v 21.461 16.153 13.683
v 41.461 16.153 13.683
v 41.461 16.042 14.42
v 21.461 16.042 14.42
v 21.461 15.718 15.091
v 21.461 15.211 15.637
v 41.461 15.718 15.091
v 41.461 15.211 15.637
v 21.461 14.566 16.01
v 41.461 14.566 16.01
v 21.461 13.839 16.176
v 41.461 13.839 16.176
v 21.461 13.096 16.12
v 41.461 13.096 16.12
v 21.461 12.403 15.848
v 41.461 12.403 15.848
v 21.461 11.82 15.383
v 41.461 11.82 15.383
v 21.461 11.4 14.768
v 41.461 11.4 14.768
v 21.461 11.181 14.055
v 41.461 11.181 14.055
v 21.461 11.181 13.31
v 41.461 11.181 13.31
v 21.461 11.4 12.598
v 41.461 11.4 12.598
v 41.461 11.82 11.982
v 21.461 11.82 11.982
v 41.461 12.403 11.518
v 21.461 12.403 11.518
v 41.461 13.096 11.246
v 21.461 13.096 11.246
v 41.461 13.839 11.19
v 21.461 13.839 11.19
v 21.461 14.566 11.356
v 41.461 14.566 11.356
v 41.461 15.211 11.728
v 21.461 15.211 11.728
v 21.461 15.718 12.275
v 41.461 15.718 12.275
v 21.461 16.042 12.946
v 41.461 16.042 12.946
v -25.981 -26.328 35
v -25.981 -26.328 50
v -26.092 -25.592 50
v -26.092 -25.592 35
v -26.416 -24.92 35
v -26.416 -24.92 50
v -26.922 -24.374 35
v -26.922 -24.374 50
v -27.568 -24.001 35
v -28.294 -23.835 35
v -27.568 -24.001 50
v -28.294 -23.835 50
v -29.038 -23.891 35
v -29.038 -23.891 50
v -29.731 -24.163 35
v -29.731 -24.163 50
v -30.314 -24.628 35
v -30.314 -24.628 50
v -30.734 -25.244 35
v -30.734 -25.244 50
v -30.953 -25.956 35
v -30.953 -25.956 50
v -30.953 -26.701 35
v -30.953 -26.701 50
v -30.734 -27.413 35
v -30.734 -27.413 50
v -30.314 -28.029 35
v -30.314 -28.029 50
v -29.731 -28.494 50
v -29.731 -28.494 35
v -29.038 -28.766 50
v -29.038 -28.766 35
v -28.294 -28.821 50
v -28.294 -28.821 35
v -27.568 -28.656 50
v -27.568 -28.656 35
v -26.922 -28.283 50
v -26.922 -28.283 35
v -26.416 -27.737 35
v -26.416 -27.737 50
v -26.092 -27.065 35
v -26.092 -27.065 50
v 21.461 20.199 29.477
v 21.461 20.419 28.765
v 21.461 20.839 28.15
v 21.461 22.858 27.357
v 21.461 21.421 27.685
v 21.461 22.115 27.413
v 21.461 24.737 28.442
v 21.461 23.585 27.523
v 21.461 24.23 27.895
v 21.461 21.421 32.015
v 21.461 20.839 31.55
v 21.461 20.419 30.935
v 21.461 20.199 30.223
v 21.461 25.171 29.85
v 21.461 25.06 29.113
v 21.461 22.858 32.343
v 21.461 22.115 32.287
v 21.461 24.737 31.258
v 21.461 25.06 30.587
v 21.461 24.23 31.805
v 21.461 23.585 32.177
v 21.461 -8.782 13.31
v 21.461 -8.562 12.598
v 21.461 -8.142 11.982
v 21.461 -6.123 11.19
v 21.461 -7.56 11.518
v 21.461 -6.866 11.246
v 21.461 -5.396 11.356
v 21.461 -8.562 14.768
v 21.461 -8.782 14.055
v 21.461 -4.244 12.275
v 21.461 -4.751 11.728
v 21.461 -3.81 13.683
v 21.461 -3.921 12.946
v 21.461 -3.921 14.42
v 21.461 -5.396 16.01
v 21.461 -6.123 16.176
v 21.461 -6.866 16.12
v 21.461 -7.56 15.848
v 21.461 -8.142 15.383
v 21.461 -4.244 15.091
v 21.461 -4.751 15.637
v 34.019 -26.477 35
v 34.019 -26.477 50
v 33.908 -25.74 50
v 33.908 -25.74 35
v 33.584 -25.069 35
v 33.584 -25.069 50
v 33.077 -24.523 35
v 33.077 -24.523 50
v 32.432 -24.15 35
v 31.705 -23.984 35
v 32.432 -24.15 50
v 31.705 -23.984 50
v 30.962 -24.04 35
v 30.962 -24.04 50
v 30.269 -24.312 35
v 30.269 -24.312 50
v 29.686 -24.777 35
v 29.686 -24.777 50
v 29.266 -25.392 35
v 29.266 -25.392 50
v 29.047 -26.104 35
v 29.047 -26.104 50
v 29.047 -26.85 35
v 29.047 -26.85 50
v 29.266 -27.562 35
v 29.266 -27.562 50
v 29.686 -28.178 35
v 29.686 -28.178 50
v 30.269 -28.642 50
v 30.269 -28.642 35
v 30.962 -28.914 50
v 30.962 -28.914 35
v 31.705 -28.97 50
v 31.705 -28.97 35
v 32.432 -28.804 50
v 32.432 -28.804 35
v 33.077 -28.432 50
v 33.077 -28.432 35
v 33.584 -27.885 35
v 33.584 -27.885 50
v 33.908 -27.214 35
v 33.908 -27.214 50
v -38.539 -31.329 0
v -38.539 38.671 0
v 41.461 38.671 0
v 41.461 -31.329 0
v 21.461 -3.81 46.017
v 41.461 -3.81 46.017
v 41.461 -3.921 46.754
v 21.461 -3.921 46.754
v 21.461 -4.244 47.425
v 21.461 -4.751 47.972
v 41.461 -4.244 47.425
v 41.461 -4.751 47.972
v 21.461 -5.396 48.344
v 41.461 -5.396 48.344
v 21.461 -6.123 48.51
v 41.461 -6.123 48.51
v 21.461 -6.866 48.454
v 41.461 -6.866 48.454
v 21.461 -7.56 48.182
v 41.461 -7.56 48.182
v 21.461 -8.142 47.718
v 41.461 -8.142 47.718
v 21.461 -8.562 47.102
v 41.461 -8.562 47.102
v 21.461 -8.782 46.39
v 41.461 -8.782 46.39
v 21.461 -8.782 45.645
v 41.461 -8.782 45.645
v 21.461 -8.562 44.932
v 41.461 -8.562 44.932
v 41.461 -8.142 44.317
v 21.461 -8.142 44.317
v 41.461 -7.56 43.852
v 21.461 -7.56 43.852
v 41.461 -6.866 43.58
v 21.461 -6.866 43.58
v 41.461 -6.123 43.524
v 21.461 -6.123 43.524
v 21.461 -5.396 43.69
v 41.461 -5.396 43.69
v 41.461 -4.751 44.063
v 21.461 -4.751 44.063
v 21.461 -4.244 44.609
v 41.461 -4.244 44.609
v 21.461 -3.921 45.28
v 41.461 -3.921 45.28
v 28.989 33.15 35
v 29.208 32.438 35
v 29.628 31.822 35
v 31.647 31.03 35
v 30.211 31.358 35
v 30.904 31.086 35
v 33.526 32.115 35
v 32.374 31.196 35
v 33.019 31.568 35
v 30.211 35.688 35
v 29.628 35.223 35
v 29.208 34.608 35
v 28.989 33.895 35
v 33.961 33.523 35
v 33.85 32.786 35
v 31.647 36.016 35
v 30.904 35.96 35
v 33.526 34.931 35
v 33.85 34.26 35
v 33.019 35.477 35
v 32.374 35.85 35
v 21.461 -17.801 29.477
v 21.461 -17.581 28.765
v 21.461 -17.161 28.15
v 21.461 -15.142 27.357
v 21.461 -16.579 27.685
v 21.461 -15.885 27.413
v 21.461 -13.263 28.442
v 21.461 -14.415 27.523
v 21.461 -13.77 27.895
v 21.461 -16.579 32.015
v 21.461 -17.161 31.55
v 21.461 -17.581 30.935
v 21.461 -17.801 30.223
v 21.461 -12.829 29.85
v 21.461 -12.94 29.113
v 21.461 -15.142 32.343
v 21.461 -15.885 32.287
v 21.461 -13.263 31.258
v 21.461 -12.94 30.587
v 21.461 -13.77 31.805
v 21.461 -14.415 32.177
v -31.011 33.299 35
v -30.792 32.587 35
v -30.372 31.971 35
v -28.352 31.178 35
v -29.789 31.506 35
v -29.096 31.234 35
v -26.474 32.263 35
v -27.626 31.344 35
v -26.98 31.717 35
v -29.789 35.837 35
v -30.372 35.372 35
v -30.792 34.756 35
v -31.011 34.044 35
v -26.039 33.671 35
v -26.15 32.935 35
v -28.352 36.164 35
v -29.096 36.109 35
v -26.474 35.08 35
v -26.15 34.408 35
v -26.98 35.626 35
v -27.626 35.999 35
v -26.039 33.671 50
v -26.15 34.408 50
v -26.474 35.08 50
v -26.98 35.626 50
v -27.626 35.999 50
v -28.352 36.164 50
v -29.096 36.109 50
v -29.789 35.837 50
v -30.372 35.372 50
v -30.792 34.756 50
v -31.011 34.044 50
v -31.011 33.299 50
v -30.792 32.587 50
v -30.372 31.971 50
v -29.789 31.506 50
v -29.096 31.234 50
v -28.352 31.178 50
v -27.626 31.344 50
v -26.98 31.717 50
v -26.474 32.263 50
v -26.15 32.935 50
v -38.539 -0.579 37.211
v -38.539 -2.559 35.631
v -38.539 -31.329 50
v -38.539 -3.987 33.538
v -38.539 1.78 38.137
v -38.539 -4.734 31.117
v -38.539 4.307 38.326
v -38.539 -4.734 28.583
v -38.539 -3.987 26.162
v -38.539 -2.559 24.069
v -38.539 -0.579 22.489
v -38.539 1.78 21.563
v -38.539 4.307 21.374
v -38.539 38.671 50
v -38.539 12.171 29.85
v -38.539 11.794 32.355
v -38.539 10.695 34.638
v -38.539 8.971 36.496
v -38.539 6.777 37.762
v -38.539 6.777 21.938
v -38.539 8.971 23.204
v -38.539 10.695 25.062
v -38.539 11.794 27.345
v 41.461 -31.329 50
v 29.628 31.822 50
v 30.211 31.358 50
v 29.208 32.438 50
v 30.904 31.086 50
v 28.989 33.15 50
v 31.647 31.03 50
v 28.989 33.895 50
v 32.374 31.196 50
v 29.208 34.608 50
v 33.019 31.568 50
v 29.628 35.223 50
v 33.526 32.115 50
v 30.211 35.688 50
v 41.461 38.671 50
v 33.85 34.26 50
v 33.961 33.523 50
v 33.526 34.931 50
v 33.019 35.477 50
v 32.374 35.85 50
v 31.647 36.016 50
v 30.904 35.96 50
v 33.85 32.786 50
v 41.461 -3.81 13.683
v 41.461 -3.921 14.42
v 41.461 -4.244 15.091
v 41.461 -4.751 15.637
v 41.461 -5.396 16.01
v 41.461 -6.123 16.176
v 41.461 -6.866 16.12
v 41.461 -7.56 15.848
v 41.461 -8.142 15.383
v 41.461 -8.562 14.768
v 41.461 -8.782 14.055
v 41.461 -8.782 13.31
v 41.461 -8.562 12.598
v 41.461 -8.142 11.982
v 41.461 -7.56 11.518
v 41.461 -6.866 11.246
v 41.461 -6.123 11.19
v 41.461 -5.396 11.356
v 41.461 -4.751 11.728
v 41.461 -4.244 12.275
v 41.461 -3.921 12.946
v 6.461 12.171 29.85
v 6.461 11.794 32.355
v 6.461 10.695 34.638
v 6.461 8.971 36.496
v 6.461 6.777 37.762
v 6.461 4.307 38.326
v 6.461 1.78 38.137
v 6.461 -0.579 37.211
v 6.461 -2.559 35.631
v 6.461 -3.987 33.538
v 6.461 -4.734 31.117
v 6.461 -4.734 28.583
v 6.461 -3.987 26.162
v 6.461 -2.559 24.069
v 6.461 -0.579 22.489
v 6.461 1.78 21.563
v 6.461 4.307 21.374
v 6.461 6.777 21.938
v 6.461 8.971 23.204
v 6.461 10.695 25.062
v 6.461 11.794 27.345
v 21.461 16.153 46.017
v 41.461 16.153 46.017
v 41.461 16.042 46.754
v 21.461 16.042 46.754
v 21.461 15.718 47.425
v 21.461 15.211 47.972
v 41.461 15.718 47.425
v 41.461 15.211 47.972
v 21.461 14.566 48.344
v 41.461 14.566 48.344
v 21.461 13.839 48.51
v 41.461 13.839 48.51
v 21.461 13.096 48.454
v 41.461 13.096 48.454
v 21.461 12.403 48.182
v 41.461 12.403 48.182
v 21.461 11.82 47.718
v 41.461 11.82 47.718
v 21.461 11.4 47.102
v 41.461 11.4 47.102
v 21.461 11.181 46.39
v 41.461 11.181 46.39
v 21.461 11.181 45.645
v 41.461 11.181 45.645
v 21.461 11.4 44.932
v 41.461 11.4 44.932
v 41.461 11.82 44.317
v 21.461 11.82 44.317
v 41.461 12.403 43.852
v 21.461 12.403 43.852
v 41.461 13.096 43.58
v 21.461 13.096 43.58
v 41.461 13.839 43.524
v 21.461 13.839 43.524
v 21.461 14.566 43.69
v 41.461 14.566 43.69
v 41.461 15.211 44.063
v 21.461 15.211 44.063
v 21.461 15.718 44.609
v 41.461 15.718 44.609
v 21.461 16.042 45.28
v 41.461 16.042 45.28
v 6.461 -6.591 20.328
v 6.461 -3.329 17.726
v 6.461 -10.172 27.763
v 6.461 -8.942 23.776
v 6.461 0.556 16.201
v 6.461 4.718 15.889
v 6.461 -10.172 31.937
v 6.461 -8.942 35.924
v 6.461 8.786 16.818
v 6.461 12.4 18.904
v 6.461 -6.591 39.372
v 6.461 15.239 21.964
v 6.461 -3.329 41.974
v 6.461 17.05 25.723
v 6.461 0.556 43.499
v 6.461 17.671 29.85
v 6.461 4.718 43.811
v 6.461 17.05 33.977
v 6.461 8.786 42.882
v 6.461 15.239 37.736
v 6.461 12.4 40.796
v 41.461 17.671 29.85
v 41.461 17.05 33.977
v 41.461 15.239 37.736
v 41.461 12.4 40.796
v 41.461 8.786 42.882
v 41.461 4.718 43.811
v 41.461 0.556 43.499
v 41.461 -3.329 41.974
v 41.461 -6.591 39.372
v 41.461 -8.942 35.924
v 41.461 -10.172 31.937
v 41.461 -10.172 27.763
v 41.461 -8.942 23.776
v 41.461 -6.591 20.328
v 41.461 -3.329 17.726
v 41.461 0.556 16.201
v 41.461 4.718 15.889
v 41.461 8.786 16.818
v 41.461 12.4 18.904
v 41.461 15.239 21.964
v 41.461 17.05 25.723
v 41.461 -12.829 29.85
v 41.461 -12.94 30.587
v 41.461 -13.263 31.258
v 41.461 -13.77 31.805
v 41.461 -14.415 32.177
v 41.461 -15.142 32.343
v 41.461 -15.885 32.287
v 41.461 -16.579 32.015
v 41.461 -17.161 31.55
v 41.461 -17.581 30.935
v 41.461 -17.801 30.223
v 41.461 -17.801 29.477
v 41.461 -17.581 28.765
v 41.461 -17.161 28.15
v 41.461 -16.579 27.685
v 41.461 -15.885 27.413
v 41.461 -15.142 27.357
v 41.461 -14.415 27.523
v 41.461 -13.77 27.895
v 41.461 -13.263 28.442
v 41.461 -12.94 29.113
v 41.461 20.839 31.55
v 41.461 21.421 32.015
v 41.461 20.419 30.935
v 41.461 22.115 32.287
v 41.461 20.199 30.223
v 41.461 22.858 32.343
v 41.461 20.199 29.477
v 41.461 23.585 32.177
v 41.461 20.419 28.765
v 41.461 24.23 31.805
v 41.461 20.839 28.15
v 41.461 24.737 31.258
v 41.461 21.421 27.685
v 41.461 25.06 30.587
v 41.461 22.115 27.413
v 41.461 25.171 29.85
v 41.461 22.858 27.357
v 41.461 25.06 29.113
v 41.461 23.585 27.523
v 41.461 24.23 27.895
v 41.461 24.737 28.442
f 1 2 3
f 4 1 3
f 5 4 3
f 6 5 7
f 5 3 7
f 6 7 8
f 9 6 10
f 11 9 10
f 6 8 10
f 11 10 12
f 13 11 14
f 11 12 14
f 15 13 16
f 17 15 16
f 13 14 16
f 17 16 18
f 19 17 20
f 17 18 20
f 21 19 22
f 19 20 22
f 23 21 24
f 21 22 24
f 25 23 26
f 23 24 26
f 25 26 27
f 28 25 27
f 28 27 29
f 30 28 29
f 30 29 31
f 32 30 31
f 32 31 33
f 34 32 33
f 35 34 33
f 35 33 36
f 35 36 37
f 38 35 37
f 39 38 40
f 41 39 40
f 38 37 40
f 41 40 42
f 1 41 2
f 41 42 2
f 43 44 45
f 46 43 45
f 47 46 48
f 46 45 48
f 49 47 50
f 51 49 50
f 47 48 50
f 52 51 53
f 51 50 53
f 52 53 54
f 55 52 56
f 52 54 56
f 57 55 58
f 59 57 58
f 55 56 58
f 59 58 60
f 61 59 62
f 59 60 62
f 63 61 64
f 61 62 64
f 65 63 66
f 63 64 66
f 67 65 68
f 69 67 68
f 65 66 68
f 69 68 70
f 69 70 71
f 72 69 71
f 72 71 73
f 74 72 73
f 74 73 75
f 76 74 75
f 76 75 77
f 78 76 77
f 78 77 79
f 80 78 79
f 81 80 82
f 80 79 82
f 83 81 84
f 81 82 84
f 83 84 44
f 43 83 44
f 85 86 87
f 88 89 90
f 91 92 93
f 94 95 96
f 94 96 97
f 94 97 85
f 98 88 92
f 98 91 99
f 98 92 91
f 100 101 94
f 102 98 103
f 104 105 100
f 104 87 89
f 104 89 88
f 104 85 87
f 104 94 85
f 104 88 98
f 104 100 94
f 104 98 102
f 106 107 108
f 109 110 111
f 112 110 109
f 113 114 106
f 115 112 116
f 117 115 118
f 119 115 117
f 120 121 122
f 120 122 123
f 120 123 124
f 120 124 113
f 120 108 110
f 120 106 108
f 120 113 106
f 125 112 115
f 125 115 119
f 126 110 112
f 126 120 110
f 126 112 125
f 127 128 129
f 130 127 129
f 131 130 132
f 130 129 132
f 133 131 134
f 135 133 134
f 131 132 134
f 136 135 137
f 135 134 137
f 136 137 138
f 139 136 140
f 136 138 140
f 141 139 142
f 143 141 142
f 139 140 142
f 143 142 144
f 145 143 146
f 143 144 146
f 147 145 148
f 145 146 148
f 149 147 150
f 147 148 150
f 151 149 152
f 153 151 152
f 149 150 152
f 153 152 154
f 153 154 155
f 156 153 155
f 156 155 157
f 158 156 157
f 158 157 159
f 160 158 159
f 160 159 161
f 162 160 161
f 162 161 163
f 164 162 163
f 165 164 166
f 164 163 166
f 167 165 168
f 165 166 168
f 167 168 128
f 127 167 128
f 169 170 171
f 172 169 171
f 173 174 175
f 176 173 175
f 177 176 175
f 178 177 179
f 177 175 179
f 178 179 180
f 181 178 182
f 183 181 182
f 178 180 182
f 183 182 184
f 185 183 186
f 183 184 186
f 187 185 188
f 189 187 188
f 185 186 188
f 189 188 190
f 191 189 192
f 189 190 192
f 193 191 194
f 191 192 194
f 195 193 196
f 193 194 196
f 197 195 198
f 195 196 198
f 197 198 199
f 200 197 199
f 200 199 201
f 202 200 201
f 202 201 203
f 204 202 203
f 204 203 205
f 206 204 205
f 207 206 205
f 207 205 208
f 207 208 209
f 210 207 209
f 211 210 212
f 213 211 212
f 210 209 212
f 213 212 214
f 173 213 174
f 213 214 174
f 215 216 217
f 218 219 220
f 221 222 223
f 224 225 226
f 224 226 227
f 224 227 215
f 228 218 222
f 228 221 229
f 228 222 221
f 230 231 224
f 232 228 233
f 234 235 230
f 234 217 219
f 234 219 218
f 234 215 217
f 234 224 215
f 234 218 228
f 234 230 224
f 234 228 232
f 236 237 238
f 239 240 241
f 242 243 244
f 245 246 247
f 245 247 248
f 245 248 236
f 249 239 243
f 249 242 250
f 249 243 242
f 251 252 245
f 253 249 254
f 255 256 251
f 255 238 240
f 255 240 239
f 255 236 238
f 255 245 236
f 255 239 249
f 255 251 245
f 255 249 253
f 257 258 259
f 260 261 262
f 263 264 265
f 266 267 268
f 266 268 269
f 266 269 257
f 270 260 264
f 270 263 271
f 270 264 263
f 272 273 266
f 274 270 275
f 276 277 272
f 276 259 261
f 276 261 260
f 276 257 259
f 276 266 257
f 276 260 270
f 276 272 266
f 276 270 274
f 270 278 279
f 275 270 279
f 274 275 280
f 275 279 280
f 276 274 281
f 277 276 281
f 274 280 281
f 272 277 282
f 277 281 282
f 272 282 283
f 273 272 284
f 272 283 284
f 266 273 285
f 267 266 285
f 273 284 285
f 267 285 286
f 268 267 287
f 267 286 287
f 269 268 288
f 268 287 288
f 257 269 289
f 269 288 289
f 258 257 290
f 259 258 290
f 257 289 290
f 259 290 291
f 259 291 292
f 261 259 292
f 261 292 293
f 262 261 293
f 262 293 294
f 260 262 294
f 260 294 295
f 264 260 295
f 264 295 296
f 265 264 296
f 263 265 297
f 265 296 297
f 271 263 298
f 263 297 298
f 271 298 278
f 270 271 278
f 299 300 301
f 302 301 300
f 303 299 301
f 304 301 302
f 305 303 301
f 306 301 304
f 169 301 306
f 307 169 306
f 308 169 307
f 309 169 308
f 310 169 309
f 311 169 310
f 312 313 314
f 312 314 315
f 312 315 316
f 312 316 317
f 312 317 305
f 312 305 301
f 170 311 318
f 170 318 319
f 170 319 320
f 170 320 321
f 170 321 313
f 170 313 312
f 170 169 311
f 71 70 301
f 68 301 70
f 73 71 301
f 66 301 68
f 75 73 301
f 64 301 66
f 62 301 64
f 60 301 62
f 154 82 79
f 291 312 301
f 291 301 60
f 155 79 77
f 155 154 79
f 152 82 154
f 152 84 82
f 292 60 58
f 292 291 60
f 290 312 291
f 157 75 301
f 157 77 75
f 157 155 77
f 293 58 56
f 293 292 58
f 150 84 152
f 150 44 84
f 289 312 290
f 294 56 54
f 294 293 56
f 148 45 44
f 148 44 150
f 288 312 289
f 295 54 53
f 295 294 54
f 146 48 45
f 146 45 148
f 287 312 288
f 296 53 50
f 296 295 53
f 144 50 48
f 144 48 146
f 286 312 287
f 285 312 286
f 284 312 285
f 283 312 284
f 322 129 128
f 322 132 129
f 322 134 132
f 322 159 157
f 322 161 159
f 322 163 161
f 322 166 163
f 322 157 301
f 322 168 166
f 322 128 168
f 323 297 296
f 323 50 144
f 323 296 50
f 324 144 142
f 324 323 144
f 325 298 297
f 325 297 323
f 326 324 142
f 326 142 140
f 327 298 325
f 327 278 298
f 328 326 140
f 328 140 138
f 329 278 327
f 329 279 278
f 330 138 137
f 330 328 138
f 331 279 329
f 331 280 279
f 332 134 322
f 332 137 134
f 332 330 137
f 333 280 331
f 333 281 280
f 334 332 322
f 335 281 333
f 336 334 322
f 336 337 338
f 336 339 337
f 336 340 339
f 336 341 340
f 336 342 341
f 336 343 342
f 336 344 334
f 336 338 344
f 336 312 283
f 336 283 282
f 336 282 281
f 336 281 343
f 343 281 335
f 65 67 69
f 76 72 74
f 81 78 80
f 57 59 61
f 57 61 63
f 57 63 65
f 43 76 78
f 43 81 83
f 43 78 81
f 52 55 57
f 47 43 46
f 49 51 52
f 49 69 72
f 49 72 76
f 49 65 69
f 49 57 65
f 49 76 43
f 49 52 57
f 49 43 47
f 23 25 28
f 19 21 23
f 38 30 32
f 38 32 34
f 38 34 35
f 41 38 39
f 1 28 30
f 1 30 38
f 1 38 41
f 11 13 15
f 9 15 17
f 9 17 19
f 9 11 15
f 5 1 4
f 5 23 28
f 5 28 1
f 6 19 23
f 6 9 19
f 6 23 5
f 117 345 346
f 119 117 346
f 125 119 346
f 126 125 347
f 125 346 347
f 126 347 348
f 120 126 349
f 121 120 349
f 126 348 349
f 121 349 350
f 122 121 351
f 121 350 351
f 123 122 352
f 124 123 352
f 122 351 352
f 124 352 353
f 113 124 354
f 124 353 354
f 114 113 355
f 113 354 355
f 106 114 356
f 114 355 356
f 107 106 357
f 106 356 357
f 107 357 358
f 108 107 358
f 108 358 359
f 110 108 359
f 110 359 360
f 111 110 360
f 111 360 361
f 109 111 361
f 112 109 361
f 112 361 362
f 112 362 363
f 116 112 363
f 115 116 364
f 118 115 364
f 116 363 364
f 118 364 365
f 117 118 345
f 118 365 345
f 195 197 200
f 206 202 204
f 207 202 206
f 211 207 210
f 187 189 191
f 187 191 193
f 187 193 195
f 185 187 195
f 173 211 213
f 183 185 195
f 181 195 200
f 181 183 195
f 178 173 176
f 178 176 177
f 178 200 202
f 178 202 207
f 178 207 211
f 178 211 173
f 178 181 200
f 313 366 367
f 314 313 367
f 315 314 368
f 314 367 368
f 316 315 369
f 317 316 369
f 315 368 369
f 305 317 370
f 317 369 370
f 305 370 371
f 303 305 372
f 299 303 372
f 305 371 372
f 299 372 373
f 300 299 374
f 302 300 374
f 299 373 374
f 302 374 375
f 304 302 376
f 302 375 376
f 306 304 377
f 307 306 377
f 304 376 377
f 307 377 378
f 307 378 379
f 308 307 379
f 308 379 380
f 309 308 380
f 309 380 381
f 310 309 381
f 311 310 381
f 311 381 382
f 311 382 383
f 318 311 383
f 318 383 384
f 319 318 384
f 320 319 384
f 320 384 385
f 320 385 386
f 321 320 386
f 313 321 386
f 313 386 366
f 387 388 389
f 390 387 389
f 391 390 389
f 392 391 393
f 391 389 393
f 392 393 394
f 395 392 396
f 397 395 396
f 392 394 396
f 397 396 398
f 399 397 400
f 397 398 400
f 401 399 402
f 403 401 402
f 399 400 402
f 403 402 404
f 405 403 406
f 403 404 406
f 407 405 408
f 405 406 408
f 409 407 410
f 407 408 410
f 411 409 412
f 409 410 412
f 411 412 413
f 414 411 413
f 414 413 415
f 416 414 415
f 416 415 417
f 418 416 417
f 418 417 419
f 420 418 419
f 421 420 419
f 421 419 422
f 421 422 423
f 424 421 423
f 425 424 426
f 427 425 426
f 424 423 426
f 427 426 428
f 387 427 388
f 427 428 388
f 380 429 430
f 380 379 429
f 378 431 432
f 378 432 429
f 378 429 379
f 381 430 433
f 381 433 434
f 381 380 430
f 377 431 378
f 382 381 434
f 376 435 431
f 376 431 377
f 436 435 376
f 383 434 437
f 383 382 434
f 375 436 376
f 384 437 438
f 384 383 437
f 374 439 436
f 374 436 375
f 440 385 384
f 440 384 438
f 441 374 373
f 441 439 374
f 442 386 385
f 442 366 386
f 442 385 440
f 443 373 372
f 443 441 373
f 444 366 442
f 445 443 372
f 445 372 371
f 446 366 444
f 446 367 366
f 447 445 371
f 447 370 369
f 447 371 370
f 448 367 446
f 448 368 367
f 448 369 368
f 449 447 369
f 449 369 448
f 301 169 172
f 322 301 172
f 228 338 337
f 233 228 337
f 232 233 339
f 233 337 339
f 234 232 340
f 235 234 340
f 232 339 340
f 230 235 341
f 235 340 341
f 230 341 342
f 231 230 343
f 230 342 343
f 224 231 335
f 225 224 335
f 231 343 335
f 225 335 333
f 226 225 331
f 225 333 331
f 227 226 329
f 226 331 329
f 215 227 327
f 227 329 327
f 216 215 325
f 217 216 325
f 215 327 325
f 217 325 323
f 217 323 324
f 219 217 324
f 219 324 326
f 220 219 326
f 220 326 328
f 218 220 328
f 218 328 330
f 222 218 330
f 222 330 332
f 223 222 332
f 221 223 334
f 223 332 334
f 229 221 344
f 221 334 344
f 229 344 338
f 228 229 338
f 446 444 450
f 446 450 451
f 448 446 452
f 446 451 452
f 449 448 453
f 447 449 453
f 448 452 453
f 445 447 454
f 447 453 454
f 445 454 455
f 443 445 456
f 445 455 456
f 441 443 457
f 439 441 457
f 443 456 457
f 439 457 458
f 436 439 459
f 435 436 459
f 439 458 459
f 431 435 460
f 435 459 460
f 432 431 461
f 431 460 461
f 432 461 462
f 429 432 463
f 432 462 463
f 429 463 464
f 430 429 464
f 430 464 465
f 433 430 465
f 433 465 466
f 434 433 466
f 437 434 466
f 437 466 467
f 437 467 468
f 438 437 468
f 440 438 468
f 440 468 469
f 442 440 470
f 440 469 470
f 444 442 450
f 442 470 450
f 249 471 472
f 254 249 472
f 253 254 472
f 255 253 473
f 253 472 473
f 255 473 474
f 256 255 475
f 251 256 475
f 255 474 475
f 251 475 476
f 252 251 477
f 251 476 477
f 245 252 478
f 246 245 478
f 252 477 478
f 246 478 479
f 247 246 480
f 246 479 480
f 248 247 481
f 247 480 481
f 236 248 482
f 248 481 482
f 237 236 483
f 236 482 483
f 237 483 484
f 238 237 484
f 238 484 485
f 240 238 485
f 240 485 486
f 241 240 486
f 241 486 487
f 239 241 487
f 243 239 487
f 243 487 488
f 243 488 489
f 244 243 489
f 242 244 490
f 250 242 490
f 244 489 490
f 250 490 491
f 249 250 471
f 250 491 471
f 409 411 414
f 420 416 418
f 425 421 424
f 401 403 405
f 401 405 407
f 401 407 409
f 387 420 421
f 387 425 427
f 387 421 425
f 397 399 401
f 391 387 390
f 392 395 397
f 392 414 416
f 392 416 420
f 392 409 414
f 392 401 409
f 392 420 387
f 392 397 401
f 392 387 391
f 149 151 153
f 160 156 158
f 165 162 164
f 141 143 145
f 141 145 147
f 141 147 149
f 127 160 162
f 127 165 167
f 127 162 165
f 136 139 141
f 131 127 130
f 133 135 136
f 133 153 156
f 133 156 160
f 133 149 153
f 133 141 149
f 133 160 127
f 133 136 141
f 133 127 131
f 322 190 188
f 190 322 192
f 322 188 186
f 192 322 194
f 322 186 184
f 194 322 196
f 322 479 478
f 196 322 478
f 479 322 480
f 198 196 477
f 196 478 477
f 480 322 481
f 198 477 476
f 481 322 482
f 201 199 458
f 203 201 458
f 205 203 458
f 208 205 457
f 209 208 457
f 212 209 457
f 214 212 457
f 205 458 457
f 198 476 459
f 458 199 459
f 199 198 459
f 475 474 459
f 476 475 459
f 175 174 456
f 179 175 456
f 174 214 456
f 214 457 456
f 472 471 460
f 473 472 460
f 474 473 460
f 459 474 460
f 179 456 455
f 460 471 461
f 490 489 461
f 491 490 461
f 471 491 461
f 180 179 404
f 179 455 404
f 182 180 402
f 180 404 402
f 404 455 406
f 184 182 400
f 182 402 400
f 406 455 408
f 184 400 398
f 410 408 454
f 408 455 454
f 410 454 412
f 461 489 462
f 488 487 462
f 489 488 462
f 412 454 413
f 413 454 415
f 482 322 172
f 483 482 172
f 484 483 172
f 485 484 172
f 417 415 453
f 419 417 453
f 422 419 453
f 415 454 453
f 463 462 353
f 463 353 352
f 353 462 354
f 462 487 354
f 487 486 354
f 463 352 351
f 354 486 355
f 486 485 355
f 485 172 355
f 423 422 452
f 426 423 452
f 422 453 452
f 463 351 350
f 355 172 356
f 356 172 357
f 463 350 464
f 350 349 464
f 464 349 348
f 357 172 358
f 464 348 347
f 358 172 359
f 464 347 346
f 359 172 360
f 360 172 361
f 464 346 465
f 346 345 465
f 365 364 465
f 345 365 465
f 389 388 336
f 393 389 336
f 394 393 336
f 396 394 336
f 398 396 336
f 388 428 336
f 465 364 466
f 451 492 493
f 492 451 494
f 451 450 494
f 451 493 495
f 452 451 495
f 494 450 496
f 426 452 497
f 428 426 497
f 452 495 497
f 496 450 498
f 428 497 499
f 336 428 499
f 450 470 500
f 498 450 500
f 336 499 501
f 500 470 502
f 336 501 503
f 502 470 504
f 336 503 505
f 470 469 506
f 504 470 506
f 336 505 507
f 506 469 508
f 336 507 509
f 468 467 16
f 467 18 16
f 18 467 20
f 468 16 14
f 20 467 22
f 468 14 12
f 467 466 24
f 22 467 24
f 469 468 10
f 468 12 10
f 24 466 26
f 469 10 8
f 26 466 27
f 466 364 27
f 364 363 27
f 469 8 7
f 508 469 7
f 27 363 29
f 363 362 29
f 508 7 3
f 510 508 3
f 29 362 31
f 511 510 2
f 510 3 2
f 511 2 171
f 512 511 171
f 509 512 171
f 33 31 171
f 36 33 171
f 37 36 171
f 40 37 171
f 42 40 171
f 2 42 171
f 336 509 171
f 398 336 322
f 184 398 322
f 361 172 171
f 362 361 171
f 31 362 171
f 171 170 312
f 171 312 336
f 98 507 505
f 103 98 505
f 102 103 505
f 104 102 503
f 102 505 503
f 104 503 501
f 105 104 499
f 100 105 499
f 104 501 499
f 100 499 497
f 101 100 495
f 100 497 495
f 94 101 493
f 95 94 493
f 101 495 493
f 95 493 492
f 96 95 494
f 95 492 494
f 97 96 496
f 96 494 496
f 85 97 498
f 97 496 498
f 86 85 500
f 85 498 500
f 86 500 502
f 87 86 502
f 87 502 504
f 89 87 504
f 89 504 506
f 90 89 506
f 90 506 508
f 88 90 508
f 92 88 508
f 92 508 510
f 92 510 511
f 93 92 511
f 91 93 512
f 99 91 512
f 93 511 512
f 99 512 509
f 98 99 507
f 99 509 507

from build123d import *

# Parameters (mm, degrees)
F0_W     = 80
F0_H     = 70
F1_DEPTH = 50
F2_R     = 2.5
F3_DEPTH = 15
F4_R     = 8.5
F5_DEPTH = 92.7
F4_R_2   = 14
F6_DEPTH = 35
F4_R_3   = 2.5
F7_DEPTH = 20


with BuildPart() as f1:
    # F0 (on Top) → F1 (new body)
    with BuildSketch(Plane.XY):
        with Locations((1.460786, 3.671486)):
            Rectangle(F0_W, F0_H)
    extrude(amount=F1_DEPTH)

    # F2 (on face) → F3 (cut)
    with BuildSketch(Plane.XY.offset(50)):
        with Locations((-28.539214, 33.671486)):
            Circle(F2_R)
        with Locations((-28.481222, -26.328486)):
            Circle(F2_R)
        with Locations((31.460602, 33.522883)):
            Circle(F2_R)
        with Locations((31.518594, -26.477089)):
            Circle(F2_R)
    extrude(amount=-F3_DEPTH, mode=Mode.SUBTRACT)

    # F4 (on face) → F5 (cut)
    with BuildSketch(Plane.YZ.offset(41.460786)):
        with Locations((3.671486, 29.85)):
            Circle(F4_R)
    extrude(amount=-F5_DEPTH, mode=Mode.SUBTRACT)

    # F4 (on face) → F6 (cut)
    with BuildSketch(Plane.YZ.offset(41.460786)):
        with Locations((3.671486, 29.85)):
            Circle(F4_R_2)
        with Locations((3.671486, 29.85)):
            Circle(F4_R, mode=Mode.SUBTRACT)
    extrude(amount=-F6_DEPTH, mode=Mode.SUBTRACT)

    # F4 (on face) → F7 (cut)
    with BuildSketch(Plane.YZ.offset(41.460786)):
        with Locations((-6.309632, 46.017167)):
            Circle(F4_R_3)
        with Locations((-15.328514, 29.85)):
            Circle(F4_R_3)
        with Locations((-6.309632, 13.682833)):
            Circle(F4_R_3)
        with Locations((13.652604, 13.682833)):
            Circle(F4_R_3)
        with Locations((22.671486, 29.85)):
            Circle(F4_R_3)
        with Locations((13.652604, 46.017167)):
            Circle(F4_R_3)
    extrude(amount=-F7_DEPTH, mode=Mode.SUBTRACT)


solid = f1.part
